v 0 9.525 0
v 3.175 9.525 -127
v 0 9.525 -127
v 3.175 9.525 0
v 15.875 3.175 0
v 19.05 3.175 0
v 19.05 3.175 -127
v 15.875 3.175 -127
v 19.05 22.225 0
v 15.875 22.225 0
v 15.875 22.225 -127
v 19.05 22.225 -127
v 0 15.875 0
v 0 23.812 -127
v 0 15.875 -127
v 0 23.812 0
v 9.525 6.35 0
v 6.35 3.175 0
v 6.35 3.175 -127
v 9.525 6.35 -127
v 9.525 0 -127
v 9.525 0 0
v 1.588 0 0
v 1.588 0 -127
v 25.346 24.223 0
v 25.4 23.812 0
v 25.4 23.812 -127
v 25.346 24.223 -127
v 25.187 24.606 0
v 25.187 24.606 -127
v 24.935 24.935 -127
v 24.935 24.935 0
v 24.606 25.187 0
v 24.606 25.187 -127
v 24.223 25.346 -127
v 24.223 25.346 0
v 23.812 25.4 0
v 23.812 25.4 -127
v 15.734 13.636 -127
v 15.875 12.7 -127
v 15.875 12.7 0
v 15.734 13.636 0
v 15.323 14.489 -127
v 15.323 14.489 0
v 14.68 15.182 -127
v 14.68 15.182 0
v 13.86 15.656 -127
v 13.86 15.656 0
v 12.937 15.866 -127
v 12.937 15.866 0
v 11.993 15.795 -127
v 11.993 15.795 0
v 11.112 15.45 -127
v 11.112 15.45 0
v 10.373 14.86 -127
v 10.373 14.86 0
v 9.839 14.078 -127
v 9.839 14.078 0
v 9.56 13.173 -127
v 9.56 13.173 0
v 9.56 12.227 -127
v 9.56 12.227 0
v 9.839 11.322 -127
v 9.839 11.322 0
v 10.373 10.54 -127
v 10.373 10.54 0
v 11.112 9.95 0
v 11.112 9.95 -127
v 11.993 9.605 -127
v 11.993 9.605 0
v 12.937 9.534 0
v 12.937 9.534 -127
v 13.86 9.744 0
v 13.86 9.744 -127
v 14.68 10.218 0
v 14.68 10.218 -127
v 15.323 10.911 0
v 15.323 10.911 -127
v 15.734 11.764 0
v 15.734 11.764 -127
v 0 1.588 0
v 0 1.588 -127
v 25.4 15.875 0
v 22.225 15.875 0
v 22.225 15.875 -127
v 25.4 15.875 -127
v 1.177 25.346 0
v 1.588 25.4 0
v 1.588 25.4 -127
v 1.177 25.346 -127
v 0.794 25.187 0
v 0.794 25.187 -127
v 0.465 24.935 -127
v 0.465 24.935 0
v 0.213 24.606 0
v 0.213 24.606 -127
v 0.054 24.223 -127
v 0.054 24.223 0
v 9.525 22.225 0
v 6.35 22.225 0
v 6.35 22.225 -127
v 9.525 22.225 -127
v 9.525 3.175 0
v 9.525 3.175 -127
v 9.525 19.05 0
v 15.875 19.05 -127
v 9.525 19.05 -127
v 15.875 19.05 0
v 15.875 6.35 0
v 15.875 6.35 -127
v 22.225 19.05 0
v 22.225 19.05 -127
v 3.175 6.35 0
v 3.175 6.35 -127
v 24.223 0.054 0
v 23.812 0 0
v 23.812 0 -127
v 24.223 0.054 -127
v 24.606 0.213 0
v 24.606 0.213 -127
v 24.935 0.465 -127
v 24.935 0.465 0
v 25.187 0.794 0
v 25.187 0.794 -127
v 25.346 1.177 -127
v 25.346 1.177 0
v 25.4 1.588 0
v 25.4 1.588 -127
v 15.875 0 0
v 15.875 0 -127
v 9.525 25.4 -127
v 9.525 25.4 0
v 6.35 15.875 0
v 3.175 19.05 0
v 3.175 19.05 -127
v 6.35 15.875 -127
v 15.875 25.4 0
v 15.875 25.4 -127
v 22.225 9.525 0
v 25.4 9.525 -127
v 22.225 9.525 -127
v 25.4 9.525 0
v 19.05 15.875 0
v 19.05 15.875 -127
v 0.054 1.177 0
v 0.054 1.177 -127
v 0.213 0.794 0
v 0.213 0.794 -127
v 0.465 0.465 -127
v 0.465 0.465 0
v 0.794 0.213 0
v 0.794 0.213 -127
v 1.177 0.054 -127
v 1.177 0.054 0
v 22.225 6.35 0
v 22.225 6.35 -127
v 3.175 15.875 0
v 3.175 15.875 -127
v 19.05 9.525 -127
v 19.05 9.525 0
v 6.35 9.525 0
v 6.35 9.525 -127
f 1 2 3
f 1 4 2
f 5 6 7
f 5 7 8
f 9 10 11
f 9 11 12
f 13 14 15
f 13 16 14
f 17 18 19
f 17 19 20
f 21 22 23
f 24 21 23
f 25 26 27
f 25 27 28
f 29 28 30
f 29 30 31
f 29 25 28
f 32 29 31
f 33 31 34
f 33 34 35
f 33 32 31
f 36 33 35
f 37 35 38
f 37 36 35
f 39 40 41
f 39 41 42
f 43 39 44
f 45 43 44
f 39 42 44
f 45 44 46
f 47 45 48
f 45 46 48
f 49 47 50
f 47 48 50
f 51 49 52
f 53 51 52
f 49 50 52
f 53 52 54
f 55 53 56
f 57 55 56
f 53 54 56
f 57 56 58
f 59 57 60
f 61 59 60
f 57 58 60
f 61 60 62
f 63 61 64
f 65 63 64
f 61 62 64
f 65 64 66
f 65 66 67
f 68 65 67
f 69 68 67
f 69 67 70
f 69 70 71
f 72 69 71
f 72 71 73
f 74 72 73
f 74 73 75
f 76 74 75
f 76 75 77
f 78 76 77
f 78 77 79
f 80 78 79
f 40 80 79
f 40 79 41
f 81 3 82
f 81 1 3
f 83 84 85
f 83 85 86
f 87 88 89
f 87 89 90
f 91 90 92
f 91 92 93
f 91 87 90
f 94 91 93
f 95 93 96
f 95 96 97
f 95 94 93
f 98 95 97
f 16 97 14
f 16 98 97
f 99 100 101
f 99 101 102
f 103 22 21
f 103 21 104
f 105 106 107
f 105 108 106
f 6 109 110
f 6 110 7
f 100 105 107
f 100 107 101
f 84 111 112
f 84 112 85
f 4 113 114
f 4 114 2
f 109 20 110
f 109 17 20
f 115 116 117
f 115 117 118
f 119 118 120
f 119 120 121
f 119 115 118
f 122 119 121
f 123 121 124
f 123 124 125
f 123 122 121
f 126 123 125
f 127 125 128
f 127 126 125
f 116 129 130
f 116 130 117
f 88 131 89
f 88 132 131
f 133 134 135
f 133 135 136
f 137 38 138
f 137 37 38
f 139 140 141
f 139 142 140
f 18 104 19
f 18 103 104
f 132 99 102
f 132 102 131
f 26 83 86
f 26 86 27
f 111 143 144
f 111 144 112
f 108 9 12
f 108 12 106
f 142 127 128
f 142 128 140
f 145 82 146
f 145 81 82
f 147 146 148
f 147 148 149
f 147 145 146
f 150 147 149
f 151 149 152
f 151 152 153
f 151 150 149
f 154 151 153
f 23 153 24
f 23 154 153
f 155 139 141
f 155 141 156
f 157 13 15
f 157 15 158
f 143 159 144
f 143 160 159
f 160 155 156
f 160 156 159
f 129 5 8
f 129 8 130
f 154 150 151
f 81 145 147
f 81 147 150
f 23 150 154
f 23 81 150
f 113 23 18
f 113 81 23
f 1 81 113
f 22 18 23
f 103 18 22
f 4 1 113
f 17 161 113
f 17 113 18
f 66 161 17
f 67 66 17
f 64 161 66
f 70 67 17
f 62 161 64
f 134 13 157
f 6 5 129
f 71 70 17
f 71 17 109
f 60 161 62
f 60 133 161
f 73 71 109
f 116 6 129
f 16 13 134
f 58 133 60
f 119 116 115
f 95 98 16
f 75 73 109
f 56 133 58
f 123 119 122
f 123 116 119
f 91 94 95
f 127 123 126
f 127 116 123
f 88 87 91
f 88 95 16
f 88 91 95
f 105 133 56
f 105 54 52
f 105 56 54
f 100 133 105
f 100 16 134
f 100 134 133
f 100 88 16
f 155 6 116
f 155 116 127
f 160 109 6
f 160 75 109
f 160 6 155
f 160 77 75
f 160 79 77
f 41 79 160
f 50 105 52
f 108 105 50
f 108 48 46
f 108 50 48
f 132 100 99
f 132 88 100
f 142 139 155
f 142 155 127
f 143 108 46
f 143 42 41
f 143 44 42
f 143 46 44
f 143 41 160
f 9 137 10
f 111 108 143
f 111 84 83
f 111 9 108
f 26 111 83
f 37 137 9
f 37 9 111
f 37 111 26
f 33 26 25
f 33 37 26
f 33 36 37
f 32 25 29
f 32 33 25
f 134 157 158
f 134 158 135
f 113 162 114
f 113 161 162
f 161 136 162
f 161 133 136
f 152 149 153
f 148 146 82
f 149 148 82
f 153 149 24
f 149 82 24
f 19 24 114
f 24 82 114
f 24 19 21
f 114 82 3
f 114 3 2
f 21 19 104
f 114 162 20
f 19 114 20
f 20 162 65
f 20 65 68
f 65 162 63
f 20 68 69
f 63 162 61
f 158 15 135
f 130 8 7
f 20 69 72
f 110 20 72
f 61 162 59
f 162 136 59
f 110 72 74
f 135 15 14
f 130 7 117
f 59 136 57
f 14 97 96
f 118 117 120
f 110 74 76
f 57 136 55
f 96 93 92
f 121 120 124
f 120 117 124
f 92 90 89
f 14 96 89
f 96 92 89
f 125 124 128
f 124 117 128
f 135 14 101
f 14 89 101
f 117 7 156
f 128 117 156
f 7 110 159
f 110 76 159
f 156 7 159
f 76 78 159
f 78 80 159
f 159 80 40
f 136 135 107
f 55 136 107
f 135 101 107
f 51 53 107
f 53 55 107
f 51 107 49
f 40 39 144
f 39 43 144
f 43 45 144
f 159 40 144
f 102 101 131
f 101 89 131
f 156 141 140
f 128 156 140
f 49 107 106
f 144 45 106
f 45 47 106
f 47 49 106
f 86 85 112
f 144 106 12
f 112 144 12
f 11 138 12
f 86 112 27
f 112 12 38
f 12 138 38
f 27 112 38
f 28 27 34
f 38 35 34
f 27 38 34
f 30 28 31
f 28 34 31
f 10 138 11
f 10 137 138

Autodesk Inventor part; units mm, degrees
ref_plane "YZ Plane" through (0, 0, 0) normal (1, 0, 0) x (0, 1, 0)
ref_plane "XZ Plane" through (0, 0, 0) normal (0, 1, 0) x (-1, 0, 0)
ref_plane "XY Plane" through (0, 0, 0) normal (0, 0, 1) x (1, 0, 0)
sketch "Sketch1" plane through (0, 0, 0) normal (0, 0, 1) x (1, 0, 0)
  line L0 (0, 15.875) -> (3.175, 15.875)
  line L1 (3.175, 15.875) -> (3.175, 19.05)
  line L2 (3.175, 19.05) -> (6.35, 15.875)
  line L3 (6.35, 15.875) -> (6.35, 9.525)
  line L4 (6.35, 9.525) -> (3.175, 6.35)
  line L5 (3.175, 6.35) -> (3.175, 9.525)
  line L6 (3.175, 9.525) -> (0, 9.525)
  line L7 (9.525, 0) -> (9.525, 3.175)
  line L8 (9.525, 3.175) -> (6.35, 3.175)
  line L9 (6.35, 3.175) -> (9.525, 6.35)
  line L10 (9.525, 6.35) -> (15.875, 6.35)
  line L11 (15.875, 6.35) -> (19.05, 3.175)
  line L12 (19.05, 3.175) -> (15.875, 3.175)
  line L13 (15.875, 3.175) -> (15.875, 0)
  line L14 (25.4, 9.525) -> (22.225, 9.525)
  line L15 (22.225, 9.525) -> (22.225, 6.35)
  line L16 (22.225, 6.35) -> (19.05, 9.525)
  line L17 (19.05, 9.525) -> (19.05, 15.875)
  line L18 (19.05, 15.875) -> (22.225, 19.05)
  line L19 (22.225, 19.05) -> (22.225, 15.875)
  line L20 (22.225, 15.875) -> (25.4, 15.875)
  line L21 (15.875, 25.4) -> (15.875, 22.225)
  line L22 (15.875, 22.225) -> (19.05, 22.225)
  line L23 (19.05, 22.225) -> (15.875, 19.05)
  line L24 (15.875, 19.05) -> (9.525, 19.05)
  line L25 (9.525, 19.05) -> (6.35, 22.225)
  line L26 (6.35, 22.225) -> (9.525, 22.225)
  line L27 (9.525, 22.225) -> (9.525, 25.4)
  circle A0 centre (12.7, 12.7) radius 3.175
  line L28 (0, 23.8125) -> (0, 15.875)
  line L29 (0, 9.525) -> (0, 1.5875)
  line L30 (9.525, 0) -> (1.5875, 0)
  line L31 (15.875, 0) -> (23.8125, 0)
  line L32 (25.4, 1.5875) -> (25.4, 9.525)
  line L33 (25.4, 15.875) -> (25.4, 23.8125)
  line L34 (23.8125, 25.4) -> (15.875, 25.4)
  line L35 (9.525, 25.4) -> (1.5875, 25.4)
  arc A1 (0, 1.5875) -> (1.5875, 0) centre (1.5875, 1.5875) ccw
  arc A2 (1.5875, 25.4) -> (0, 23.8125) centre (1.5875, 23.8125) ccw
  arc A3 (25.4, 23.8125) -> (23.8125, 25.4) centre (23.8125, 23.8125) ccw
  arc A4 (23.8125, 0) -> (25.4, 1.5875) centre (23.8125, 1.5875) ccw
  point P0 (0, 0)
  point P1 (25.4, 0)
  point P2 (0, 25.4)
  dimension "d5" = 6.35
  dimension "d7" = 12.7
  dimension "d8" = 3.175
  dimension "d9" = 3.175
  dimension "d13" = 360
  dimension "d15" = 6.35
  dimension "d16" = 1.5875
extrude "Extrusion2" add sketch "Sketch1" against normal blind 127
properties part number "motor stop for turret"
